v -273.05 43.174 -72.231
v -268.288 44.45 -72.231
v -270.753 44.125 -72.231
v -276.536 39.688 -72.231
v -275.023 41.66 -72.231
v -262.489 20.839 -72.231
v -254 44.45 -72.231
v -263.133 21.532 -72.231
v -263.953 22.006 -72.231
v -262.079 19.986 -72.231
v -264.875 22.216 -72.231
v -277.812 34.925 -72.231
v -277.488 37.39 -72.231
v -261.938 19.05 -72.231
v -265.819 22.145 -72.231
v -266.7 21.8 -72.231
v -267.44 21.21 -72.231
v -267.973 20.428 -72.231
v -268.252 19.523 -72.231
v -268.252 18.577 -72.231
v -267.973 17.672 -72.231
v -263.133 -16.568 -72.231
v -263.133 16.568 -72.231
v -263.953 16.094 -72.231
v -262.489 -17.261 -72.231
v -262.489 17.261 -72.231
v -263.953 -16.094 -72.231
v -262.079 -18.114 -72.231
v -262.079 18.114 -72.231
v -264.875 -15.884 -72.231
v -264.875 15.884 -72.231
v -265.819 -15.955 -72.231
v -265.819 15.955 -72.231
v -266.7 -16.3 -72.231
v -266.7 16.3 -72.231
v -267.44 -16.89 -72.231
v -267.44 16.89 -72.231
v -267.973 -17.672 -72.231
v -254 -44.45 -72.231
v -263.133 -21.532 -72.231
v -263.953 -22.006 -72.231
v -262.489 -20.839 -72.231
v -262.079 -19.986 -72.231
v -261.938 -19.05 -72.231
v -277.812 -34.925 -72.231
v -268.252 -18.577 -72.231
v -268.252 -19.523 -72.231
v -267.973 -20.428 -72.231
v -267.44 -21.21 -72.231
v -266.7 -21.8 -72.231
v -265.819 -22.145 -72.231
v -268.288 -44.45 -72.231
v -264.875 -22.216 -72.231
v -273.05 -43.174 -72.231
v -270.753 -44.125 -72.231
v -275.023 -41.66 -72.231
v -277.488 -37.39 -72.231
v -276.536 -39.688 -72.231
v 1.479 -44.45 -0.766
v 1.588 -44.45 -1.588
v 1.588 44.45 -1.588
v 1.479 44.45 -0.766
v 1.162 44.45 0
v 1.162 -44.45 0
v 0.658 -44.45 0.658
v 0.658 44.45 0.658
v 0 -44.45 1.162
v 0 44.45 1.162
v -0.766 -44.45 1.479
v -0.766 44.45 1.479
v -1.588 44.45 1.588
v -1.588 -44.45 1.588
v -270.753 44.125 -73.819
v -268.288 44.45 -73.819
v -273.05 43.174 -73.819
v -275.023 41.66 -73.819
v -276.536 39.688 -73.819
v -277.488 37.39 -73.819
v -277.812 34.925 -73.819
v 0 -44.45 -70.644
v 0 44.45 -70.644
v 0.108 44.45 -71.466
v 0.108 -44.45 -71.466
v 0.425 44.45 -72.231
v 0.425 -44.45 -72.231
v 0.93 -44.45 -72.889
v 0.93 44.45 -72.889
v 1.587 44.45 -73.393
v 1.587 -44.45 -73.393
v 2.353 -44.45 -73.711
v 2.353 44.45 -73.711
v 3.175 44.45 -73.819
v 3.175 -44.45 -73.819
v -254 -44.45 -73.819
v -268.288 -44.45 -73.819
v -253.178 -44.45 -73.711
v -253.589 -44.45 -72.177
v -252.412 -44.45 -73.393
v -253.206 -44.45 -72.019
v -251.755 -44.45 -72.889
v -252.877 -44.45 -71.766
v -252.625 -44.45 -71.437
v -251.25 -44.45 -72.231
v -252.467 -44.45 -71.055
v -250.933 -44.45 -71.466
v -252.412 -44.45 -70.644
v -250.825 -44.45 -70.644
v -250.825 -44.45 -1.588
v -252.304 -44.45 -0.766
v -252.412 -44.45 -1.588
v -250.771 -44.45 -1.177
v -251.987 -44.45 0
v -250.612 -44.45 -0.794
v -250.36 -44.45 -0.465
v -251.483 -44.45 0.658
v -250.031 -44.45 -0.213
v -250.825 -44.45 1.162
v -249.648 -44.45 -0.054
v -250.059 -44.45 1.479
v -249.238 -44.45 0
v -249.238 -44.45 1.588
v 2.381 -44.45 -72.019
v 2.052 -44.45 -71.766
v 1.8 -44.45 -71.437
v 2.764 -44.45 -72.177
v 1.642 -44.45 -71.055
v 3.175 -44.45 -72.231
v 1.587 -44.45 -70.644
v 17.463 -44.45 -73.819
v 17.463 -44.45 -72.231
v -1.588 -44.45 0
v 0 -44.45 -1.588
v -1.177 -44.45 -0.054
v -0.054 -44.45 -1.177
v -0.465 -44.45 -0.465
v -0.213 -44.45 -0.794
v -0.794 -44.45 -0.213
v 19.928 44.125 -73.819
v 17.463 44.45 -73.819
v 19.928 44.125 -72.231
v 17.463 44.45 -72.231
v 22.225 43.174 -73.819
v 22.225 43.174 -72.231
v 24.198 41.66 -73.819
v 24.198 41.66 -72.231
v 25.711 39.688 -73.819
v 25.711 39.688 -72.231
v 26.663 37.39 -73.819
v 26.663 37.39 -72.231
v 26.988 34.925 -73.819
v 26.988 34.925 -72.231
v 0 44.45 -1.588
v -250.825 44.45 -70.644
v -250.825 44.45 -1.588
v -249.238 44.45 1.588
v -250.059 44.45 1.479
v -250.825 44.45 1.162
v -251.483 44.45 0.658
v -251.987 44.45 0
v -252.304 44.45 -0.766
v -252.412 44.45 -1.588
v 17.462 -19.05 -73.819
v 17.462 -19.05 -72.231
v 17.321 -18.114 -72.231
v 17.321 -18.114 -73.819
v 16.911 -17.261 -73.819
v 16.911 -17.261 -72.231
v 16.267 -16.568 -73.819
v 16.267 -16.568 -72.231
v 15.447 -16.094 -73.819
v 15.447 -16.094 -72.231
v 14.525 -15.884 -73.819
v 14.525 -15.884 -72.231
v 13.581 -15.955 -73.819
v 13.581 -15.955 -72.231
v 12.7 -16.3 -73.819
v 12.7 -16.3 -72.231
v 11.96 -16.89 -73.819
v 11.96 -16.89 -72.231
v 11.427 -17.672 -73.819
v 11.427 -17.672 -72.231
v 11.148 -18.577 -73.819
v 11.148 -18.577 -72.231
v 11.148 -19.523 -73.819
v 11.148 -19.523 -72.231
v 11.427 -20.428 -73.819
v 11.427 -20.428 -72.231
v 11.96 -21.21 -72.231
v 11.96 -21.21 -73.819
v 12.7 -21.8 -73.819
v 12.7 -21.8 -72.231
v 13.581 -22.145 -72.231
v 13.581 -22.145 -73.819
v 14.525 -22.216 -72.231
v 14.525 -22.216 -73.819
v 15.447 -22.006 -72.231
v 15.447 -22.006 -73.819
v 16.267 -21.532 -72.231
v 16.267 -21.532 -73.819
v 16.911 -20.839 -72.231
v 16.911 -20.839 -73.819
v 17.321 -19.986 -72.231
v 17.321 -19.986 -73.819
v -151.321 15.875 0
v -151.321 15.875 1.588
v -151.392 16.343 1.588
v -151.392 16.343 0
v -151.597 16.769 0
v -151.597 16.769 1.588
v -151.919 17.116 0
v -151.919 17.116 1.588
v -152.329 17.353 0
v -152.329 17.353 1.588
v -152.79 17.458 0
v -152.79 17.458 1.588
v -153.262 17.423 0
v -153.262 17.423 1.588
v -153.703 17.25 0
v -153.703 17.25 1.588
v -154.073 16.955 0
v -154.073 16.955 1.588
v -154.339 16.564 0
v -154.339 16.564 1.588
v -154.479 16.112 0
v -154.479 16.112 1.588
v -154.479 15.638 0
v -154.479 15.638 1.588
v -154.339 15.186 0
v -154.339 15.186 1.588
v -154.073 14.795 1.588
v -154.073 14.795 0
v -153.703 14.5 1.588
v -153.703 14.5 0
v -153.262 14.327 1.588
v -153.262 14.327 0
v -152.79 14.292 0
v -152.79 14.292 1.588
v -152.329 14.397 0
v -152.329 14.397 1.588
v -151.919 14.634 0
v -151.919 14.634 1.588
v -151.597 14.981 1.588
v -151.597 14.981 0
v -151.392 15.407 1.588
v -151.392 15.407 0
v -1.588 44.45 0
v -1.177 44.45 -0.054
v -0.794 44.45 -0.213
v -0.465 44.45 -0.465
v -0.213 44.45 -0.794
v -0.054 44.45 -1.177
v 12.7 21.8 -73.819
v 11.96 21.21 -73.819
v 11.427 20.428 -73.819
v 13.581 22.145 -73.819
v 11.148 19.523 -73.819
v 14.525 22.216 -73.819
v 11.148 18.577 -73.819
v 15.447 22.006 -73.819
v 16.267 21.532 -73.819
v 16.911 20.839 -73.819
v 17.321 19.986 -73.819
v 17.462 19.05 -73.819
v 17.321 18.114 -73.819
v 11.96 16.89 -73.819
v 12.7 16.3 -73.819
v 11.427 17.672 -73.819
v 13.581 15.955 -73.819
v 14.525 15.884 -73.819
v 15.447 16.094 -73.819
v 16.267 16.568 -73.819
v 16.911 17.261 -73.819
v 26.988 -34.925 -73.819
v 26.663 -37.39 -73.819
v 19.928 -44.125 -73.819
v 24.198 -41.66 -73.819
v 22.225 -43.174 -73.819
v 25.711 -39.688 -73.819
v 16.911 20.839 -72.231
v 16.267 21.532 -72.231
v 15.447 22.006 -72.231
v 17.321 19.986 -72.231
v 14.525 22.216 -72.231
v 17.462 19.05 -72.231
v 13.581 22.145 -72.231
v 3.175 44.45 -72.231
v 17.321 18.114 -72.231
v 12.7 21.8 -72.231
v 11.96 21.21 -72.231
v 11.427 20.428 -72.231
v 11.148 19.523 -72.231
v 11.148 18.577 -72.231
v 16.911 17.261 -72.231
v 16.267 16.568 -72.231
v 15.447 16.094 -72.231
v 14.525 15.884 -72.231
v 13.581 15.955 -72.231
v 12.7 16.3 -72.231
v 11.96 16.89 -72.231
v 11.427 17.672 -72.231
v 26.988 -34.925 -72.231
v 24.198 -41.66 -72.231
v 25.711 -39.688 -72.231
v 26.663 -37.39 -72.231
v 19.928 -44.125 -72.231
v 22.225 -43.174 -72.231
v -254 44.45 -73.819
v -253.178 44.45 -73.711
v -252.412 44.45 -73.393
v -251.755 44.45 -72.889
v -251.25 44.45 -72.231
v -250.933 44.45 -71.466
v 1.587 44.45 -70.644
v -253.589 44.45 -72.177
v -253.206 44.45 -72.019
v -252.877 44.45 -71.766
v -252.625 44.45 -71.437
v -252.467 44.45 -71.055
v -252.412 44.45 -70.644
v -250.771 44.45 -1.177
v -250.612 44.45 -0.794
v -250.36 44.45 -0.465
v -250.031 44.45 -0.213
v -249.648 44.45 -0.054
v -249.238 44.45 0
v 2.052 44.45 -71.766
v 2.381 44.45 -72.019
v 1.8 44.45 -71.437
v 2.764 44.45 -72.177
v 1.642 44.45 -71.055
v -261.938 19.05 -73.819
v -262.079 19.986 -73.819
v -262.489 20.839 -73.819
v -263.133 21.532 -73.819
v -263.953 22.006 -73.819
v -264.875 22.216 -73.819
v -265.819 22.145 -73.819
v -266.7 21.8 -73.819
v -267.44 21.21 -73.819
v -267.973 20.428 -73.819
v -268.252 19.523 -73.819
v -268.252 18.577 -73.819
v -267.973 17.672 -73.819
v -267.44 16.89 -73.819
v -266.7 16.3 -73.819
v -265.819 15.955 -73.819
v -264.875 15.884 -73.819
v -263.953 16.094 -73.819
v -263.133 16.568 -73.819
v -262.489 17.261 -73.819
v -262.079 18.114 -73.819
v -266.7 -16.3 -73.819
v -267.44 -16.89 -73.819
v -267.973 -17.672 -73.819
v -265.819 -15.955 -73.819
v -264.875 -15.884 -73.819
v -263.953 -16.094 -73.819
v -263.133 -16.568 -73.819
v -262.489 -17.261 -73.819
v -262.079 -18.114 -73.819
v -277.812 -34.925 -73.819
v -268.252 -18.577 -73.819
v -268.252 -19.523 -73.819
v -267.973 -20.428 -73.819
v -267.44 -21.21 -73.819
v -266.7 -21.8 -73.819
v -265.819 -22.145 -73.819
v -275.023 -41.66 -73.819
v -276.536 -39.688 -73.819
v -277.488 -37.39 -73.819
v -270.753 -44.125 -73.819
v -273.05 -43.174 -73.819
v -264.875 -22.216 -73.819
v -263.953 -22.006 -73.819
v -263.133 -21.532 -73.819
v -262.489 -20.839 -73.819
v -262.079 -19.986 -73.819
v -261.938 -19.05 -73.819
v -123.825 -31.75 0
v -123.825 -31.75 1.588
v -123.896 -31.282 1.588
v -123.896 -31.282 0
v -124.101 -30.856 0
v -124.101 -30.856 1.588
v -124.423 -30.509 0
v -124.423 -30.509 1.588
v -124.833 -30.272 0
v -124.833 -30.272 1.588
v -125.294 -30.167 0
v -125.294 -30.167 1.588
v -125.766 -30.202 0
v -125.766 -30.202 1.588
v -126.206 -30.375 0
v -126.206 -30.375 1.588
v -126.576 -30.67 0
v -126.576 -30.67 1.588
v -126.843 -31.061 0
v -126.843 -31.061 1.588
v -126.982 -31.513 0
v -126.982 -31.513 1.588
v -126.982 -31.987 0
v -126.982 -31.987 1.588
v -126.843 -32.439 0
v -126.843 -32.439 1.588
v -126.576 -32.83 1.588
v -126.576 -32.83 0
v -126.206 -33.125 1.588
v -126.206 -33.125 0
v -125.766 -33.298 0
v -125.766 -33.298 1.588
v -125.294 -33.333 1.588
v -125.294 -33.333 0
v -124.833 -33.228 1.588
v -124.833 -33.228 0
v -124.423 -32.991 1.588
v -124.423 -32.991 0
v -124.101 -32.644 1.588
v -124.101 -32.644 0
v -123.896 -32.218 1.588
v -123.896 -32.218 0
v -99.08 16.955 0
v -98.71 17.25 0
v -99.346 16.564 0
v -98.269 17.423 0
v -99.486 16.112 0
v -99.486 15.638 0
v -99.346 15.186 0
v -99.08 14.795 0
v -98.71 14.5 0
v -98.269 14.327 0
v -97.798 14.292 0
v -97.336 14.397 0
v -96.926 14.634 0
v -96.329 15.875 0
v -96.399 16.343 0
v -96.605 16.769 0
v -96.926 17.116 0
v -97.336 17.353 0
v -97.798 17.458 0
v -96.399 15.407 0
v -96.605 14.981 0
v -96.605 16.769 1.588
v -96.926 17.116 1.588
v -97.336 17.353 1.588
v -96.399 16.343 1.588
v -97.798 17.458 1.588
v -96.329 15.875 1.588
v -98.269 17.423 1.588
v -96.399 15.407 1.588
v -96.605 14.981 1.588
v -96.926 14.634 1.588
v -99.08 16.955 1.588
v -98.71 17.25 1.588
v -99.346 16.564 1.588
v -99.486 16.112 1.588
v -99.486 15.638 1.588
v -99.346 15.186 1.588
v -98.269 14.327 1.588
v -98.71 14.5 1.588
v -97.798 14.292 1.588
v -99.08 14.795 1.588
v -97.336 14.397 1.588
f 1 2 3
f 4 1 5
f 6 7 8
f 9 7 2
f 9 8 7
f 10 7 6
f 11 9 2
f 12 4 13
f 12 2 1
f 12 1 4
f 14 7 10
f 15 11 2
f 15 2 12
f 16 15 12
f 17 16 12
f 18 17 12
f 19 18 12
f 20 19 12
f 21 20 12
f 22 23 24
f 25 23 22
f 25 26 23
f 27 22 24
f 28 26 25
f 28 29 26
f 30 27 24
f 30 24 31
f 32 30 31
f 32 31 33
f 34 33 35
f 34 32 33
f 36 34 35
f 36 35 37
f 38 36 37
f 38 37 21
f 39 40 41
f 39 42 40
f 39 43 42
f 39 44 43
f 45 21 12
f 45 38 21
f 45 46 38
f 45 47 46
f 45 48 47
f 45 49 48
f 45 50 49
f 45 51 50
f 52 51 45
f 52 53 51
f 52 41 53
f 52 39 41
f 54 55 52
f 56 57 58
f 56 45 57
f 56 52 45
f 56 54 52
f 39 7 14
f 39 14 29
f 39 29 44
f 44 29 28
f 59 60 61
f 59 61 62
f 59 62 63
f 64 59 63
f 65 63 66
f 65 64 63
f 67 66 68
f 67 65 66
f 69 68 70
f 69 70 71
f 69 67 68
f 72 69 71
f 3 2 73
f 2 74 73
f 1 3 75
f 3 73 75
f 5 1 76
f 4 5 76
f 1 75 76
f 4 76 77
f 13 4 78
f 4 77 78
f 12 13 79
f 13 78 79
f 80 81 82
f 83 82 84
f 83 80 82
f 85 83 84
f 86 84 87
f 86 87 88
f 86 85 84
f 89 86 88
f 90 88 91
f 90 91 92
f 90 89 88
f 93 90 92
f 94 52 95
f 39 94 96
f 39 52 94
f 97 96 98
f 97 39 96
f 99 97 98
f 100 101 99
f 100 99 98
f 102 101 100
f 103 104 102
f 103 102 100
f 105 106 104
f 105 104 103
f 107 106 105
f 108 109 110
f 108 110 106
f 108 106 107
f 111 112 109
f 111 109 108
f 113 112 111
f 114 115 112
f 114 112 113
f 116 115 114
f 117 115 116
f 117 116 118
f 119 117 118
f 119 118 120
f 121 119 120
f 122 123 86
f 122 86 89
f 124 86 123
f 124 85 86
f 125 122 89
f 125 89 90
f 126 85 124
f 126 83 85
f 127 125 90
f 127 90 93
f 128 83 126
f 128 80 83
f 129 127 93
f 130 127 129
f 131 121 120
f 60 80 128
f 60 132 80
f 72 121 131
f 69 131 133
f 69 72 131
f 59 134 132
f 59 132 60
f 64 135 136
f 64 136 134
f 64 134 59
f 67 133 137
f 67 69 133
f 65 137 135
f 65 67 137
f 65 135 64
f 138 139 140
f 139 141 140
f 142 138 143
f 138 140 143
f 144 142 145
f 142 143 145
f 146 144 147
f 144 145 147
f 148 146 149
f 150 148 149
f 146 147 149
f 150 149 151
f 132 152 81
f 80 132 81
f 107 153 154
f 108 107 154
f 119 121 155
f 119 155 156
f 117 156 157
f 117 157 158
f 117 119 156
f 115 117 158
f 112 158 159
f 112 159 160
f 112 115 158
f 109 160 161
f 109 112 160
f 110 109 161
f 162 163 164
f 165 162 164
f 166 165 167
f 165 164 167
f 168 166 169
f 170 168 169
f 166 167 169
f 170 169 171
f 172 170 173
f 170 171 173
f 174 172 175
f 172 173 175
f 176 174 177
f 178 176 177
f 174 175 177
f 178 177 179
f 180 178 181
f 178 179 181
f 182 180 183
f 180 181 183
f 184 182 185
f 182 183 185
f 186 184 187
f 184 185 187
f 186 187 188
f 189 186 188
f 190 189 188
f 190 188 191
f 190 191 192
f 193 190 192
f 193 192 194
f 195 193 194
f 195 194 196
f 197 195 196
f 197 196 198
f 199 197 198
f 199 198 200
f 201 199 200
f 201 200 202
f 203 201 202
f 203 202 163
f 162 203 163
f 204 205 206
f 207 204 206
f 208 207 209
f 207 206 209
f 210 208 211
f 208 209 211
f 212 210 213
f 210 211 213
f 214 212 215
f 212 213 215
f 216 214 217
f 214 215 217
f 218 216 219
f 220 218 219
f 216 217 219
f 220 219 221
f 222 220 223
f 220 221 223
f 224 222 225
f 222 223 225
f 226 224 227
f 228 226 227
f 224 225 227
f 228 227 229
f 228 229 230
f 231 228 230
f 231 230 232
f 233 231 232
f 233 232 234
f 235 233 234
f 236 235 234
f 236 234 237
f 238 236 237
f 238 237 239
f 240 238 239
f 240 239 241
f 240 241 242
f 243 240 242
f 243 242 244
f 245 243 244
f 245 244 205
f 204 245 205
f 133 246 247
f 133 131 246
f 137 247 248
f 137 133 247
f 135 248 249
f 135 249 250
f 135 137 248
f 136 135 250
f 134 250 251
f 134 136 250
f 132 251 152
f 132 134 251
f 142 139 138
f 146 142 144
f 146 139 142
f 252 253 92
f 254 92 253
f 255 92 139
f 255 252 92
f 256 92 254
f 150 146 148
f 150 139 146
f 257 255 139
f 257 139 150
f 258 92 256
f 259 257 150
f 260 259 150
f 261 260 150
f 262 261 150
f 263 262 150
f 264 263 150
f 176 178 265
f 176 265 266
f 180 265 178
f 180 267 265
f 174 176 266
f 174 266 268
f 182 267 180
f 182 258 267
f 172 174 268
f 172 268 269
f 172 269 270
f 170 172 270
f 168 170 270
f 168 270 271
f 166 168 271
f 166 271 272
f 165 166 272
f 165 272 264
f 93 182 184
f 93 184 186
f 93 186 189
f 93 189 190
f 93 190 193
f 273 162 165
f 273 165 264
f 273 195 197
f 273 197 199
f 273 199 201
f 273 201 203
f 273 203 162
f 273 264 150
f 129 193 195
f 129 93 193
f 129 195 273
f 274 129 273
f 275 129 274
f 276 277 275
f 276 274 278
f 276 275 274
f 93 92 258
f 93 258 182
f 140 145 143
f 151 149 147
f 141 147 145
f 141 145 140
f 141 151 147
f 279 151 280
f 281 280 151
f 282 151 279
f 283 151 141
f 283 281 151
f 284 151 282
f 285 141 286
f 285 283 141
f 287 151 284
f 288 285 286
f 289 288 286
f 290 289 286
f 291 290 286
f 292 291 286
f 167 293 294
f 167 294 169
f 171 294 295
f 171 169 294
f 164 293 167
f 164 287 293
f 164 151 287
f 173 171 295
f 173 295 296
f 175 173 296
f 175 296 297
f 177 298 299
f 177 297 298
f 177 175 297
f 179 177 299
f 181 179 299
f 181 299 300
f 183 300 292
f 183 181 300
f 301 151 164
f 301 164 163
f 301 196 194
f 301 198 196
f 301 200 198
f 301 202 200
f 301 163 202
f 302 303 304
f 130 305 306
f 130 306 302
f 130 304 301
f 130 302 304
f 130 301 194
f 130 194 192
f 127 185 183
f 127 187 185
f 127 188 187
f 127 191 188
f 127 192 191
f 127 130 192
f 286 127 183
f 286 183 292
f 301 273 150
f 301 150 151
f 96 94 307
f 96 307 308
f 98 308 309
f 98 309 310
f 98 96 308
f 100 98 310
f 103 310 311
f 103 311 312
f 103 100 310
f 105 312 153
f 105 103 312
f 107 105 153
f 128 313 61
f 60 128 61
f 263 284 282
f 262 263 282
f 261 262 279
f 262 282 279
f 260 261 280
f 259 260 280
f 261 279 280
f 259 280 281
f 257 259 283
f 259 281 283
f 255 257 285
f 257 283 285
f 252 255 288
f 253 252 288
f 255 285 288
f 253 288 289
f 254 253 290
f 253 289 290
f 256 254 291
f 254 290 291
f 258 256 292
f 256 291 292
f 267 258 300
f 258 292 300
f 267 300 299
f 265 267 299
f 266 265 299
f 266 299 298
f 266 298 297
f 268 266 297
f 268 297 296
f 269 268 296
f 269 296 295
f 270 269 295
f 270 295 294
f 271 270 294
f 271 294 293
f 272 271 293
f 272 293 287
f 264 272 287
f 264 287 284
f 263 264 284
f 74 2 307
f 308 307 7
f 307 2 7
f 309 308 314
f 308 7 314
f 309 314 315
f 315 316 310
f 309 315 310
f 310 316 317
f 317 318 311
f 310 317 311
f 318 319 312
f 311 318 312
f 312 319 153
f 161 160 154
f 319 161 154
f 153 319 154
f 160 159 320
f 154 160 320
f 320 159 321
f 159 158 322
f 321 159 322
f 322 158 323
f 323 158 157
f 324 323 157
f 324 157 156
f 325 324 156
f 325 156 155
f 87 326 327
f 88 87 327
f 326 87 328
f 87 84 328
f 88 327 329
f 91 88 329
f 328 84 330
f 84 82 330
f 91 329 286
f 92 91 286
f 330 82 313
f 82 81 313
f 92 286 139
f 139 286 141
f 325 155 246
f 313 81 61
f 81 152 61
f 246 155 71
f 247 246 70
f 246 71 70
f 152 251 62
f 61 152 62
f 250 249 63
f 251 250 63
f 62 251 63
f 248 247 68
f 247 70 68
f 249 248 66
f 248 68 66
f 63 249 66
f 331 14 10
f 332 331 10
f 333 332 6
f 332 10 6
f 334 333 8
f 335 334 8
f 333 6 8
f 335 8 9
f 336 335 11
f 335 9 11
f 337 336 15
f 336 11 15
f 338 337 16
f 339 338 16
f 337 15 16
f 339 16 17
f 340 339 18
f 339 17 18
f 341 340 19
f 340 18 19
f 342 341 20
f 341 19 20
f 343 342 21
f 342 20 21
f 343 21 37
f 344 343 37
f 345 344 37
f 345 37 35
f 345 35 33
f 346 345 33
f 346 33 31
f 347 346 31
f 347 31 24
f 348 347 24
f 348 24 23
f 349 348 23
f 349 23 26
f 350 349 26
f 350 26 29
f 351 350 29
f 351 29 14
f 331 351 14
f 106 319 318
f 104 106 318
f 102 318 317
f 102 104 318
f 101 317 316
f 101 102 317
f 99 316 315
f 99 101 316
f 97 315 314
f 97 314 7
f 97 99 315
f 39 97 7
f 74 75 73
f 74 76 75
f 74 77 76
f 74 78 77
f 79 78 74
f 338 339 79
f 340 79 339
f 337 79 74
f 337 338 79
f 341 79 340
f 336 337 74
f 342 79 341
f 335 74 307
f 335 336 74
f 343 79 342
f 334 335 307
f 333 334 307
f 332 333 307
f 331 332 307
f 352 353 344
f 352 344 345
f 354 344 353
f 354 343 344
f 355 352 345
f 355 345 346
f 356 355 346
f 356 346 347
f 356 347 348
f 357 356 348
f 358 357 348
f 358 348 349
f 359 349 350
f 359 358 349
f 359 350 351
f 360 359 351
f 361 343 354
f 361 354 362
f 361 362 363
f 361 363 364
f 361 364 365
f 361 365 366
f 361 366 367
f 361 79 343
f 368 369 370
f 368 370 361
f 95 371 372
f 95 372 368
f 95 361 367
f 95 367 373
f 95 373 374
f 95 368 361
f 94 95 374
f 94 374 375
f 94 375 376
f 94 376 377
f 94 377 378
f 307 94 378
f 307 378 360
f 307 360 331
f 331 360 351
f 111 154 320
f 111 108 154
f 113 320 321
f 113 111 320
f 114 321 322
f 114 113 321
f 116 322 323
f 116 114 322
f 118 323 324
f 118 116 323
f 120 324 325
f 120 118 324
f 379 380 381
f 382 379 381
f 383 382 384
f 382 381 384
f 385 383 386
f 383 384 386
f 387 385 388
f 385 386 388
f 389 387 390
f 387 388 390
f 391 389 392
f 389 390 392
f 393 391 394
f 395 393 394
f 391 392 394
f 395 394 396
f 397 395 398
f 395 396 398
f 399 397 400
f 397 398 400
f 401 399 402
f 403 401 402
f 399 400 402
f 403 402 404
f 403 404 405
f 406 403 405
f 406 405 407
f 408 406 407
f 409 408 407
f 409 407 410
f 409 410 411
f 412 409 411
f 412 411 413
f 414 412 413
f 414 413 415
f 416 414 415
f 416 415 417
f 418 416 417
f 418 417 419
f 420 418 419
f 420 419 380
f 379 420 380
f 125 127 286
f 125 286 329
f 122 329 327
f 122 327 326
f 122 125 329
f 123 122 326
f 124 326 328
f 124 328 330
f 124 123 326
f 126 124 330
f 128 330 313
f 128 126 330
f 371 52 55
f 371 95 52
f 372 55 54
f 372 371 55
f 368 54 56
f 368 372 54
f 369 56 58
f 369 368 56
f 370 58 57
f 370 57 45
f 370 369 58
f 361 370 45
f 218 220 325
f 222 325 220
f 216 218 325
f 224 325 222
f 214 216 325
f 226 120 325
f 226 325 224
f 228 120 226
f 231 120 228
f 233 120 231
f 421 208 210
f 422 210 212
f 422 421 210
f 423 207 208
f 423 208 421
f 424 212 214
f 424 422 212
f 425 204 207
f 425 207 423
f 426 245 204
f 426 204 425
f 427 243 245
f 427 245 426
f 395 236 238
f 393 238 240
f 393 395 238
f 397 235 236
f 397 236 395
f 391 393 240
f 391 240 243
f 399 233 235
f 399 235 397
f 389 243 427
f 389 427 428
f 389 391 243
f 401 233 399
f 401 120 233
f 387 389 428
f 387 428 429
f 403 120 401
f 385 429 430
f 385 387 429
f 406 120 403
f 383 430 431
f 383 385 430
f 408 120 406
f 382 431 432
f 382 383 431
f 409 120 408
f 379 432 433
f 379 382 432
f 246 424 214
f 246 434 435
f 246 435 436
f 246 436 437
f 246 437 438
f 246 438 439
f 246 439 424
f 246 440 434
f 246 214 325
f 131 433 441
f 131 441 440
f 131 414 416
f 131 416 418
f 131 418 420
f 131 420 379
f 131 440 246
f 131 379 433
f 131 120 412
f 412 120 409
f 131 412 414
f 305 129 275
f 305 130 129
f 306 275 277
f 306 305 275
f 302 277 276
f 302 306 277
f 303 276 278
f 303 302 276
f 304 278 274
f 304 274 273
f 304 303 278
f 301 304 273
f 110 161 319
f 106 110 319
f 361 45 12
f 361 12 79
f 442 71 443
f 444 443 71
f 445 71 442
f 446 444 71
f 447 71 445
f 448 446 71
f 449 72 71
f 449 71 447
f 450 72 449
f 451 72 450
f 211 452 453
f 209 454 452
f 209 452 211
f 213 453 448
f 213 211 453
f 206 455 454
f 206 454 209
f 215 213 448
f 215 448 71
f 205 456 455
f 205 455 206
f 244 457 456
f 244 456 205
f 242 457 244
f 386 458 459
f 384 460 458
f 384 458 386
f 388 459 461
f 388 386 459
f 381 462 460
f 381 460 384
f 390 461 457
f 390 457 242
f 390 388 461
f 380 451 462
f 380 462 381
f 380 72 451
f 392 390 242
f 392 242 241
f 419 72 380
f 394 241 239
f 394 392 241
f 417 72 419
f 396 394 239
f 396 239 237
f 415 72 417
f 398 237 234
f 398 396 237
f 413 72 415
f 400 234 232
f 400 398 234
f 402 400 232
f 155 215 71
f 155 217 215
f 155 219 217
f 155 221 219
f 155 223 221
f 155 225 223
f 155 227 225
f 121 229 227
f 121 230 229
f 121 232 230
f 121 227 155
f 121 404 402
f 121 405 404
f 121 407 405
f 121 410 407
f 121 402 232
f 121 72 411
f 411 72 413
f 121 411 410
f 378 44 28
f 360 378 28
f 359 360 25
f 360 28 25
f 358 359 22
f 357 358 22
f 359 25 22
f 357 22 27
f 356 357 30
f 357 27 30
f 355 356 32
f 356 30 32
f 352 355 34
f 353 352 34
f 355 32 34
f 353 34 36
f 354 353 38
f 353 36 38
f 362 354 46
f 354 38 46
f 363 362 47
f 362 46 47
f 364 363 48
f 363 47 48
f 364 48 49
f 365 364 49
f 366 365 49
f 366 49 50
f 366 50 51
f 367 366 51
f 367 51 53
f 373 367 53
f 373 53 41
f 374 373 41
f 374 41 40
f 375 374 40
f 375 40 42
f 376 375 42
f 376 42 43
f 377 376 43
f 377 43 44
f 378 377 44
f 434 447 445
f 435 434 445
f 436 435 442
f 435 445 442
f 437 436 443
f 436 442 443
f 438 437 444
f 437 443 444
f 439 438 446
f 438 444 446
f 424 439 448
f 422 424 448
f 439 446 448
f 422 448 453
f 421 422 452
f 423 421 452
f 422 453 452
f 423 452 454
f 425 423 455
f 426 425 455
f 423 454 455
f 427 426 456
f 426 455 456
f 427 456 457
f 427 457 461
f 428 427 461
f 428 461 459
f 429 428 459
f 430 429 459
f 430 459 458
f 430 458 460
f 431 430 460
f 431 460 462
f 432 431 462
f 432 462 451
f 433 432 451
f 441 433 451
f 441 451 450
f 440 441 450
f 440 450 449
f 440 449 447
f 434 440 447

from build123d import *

# Parameters (mm, degrees)
F1_DEPTH = 44.45
F2_R     = 3.175
F2_R_2   = 1.5875
F3_DEPTH = 75.40725
F4_R     = 9.525


with BuildPart() as f1:
    # F0 (on Front) → F1 (new body, symmetric)
    with BuildSketch(Plane.XZ):
        with BuildLine():
            Line((-125.4125, 0), (-1.5875, 0))
            ThreePointArc((-1.5875, 0), (-0.4649679849, -0.4649679849), (0, -1.5875))
            Line((0, -1.5875), (0, -70.64375))
            ThreePointArc((0, -70.64375), (0.9299359697, -72.8888140303), (3.175, -73.81875))
            Line((3.175, -73.81875), (26.9875, -73.81875))
            Line((26.9875, -73.81875), (26.9875, -72.23125))
            Line((26.9875, -72.23125), (3.175, -72.23125))
            ThreePointArc((3.175, -72.23125), (2.0524679849, -71.7662820151), (1.5875, -70.64375))
            Line((1.5875, -70.64375), (1.5875, -1.5875))
            ThreePointArc((1.5875, -1.5875), (0.6575640303, 0.6575640303), (-1.5875, 1.5875))
            Line((-1.5875, 1.5875), (-125.4125, 1.5875))
            Line((-125.4125, 1.5875), (-249.2375, 1.5875))
            ThreePointArc((-249.2375, 1.5875), (-251.4825640303, 0.6575640303), (-252.4125, -1.5875))
            Line((-252.4125, -1.5875), (-252.4125, -70.64375))
            ThreePointArc((-252.4125, -70.64375), (-252.8774679849, -71.7662820151), (-254, -72.23125))
            Line((-254, -72.23125), (-277.8125, -72.23125))
            Line((-277.8125, -72.23125), (-277.8125, -73.81875))
            Line((-277.8125, -73.81875), (-254, -73.81875))
            ThreePointArc((-254, -73.81875), (-251.7549359697, -72.8888140303), (-250.825, -70.64375))
            Line((-250.825, -70.64375), (-250.825, -1.5875))
            ThreePointArc((-250.825, -1.5875), (-250.3600320151, -0.4649679849), (-249.2375, 0))
            Line((-249.2375, 0), (-125.4125, 0))
        make_face()
    extrude(amount=F1_DEPTH, both=True)

    # F2 (on face) → F3 (cut, through all)
    with BuildSketch(Plane.XY.offset(1.5875)):
        with Locations((14.2875, 19.05)):
            Circle(F2_R)
        with Locations((14.2875, -19.05)):
            Circle(F2_R)
        with Locations((-125.4125, -31.75)):
            Circle(F2_R_2)
        with Locations((-97.9161934298, 15.875)):
            Circle(F2_R_2)
        with Locations((-152.9088065702, 15.875)):
            Circle(F2_R_2)
        with Locations((-265.1125, 19.05)):
            Circle(F2_R)
        with Locations((-265.1125, -19.05)):
            Circle(F2_R)
    extrude(amount=-F3_DEPTH, mode=Mode.SUBTRACT)

    # F4
    f4_edges = [f1.edges().sort_by_distance(p)[0] for p in [
        (26.9875, 44.45, -73.025),
        (26.9875, -44.45, -73.025),
        (-277.8125, -44.45, -73.025),
        (-277.8125, 44.45, -73.025),
    ]]
    fillet(f4_edges, radius=F4_R)


solid = f1.part
